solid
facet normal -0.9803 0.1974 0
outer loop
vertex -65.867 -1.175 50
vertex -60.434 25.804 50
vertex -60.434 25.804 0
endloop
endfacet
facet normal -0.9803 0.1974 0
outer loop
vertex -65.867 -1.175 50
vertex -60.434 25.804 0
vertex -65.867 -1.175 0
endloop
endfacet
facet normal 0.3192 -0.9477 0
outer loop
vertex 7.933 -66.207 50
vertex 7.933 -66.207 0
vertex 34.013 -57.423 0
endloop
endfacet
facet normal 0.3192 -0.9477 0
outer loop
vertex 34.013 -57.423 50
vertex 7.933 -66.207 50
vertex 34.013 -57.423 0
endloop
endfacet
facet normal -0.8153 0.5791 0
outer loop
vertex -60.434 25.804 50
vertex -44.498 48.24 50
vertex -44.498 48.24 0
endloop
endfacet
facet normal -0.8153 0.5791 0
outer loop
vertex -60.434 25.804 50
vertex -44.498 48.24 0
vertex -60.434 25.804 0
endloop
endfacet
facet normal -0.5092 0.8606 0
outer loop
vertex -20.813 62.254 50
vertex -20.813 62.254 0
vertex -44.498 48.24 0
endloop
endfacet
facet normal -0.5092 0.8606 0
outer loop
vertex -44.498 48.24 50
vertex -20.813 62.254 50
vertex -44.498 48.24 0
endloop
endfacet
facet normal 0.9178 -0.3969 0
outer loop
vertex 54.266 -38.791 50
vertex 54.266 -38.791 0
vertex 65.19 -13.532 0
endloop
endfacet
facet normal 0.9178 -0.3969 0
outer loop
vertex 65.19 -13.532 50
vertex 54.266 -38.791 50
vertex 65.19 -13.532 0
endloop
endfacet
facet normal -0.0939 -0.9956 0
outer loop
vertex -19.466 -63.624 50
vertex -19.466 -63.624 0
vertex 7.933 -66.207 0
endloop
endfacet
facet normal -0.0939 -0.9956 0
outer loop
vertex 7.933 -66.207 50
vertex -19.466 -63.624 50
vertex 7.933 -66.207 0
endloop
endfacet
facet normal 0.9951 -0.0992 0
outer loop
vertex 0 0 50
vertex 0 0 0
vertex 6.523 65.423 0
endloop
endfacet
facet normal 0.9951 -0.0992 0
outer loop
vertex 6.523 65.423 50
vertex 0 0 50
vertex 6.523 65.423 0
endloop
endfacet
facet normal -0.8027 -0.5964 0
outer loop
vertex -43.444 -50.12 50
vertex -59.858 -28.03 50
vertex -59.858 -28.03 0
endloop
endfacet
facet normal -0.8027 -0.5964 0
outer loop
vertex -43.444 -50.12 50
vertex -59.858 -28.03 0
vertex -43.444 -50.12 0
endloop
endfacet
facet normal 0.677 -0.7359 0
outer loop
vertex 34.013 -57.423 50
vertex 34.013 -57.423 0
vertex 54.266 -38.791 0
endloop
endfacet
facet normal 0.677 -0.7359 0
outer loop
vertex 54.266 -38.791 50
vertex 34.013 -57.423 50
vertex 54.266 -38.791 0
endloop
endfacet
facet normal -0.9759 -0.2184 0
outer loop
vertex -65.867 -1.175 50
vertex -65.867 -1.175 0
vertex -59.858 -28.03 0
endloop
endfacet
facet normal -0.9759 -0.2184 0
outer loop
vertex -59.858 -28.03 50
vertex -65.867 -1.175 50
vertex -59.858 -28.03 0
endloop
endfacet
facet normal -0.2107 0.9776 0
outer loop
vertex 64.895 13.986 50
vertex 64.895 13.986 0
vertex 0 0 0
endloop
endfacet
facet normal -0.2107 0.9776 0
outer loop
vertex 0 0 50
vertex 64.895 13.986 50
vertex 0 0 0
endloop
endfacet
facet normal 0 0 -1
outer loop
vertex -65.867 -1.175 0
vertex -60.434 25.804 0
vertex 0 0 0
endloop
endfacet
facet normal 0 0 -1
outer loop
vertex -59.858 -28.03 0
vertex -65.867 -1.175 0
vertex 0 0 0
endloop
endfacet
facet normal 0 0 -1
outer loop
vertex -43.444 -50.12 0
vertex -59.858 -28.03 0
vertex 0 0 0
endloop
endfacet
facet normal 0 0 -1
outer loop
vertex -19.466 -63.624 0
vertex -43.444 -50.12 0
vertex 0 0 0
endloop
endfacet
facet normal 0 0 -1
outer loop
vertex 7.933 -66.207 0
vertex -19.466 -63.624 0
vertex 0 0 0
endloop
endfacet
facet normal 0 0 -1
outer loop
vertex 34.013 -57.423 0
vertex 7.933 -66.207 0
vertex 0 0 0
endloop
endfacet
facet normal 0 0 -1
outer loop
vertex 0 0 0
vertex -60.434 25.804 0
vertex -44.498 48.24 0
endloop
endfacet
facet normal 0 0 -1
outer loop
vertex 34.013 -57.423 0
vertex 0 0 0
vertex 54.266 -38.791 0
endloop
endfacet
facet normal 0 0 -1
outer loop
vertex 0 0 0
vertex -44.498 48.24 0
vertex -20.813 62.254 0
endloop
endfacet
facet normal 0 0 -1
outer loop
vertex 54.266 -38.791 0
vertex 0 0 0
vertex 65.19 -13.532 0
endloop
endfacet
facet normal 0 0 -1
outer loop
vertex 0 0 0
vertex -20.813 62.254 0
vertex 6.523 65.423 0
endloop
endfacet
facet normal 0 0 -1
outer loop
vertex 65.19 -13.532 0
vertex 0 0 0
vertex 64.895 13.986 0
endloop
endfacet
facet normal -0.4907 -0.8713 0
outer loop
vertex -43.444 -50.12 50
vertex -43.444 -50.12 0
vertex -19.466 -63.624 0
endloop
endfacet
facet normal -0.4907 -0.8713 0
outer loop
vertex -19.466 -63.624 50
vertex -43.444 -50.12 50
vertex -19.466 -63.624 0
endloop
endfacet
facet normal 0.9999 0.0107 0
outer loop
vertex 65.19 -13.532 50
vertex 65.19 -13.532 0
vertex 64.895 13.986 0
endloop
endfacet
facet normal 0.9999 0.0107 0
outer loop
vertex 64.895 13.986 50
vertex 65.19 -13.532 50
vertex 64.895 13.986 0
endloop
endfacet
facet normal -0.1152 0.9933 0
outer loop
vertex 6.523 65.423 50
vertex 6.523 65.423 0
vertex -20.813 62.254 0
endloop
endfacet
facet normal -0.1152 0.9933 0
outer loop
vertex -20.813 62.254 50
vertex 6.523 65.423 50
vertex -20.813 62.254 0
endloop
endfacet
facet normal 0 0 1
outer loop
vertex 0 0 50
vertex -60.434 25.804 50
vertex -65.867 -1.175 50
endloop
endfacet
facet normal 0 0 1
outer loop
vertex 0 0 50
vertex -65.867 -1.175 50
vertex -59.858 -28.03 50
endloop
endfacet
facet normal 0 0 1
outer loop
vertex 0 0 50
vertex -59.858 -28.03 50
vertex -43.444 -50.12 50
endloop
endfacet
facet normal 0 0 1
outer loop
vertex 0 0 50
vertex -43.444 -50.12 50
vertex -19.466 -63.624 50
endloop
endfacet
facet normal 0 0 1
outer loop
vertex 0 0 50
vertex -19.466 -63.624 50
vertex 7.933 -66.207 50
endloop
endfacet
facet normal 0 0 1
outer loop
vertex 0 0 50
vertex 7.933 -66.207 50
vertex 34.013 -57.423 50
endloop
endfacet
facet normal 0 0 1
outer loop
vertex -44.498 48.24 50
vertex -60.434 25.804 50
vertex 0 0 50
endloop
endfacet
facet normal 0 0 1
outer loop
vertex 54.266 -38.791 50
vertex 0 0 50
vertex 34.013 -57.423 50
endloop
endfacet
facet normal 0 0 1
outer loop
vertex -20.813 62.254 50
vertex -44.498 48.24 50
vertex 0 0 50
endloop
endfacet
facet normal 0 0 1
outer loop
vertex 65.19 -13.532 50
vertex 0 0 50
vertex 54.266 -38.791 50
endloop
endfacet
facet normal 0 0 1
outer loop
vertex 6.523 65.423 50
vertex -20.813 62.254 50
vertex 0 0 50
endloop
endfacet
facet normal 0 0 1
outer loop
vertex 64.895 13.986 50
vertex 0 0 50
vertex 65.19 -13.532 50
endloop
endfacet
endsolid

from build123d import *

# Parameters (mm, degrees)
F1_DEPTH = 50
F3_DEPTH = 55


with BuildPart() as f1:
    # F0 (on Top) → F1 (new body)
    with BuildSketch(Plane.XY):
        Polygon((6.523423, 65.423498), (-20.813363, 62.254017), (-44.497616, 48.239678), (-60.434112, 25.80369), (-65.867287, -1.174563), (-59.857696, -28.030294), (-43.444451, -50.119905), (-19.465552, -63.6239), (7.932832, -66.207316), (34.013272, -57.423458), (54.266222, -38.791133), (65.189763, -13.532041), (64.895117, 13.986292), (53.433229, 39.005697), (32.785965, 57.200091), align=None)
    extrude(amount=F1_DEPTH)

    # F2 (on face) → F3 (cut)
    with BuildSketch(Plane(origin=(0, 0, 0), x_dir=(1, 0, 0), z_dir=(0, 0, -1))):
        Polygon((64.895117, -13.986292), (0, 0), (6.523423, -65.423498), (32.785965, -57.200091), (53.433229, -39.005697), align=None)
    extrude(amount=-F3_DEPTH, mode=Mode.SUBTRACT)


solid = f1.part
